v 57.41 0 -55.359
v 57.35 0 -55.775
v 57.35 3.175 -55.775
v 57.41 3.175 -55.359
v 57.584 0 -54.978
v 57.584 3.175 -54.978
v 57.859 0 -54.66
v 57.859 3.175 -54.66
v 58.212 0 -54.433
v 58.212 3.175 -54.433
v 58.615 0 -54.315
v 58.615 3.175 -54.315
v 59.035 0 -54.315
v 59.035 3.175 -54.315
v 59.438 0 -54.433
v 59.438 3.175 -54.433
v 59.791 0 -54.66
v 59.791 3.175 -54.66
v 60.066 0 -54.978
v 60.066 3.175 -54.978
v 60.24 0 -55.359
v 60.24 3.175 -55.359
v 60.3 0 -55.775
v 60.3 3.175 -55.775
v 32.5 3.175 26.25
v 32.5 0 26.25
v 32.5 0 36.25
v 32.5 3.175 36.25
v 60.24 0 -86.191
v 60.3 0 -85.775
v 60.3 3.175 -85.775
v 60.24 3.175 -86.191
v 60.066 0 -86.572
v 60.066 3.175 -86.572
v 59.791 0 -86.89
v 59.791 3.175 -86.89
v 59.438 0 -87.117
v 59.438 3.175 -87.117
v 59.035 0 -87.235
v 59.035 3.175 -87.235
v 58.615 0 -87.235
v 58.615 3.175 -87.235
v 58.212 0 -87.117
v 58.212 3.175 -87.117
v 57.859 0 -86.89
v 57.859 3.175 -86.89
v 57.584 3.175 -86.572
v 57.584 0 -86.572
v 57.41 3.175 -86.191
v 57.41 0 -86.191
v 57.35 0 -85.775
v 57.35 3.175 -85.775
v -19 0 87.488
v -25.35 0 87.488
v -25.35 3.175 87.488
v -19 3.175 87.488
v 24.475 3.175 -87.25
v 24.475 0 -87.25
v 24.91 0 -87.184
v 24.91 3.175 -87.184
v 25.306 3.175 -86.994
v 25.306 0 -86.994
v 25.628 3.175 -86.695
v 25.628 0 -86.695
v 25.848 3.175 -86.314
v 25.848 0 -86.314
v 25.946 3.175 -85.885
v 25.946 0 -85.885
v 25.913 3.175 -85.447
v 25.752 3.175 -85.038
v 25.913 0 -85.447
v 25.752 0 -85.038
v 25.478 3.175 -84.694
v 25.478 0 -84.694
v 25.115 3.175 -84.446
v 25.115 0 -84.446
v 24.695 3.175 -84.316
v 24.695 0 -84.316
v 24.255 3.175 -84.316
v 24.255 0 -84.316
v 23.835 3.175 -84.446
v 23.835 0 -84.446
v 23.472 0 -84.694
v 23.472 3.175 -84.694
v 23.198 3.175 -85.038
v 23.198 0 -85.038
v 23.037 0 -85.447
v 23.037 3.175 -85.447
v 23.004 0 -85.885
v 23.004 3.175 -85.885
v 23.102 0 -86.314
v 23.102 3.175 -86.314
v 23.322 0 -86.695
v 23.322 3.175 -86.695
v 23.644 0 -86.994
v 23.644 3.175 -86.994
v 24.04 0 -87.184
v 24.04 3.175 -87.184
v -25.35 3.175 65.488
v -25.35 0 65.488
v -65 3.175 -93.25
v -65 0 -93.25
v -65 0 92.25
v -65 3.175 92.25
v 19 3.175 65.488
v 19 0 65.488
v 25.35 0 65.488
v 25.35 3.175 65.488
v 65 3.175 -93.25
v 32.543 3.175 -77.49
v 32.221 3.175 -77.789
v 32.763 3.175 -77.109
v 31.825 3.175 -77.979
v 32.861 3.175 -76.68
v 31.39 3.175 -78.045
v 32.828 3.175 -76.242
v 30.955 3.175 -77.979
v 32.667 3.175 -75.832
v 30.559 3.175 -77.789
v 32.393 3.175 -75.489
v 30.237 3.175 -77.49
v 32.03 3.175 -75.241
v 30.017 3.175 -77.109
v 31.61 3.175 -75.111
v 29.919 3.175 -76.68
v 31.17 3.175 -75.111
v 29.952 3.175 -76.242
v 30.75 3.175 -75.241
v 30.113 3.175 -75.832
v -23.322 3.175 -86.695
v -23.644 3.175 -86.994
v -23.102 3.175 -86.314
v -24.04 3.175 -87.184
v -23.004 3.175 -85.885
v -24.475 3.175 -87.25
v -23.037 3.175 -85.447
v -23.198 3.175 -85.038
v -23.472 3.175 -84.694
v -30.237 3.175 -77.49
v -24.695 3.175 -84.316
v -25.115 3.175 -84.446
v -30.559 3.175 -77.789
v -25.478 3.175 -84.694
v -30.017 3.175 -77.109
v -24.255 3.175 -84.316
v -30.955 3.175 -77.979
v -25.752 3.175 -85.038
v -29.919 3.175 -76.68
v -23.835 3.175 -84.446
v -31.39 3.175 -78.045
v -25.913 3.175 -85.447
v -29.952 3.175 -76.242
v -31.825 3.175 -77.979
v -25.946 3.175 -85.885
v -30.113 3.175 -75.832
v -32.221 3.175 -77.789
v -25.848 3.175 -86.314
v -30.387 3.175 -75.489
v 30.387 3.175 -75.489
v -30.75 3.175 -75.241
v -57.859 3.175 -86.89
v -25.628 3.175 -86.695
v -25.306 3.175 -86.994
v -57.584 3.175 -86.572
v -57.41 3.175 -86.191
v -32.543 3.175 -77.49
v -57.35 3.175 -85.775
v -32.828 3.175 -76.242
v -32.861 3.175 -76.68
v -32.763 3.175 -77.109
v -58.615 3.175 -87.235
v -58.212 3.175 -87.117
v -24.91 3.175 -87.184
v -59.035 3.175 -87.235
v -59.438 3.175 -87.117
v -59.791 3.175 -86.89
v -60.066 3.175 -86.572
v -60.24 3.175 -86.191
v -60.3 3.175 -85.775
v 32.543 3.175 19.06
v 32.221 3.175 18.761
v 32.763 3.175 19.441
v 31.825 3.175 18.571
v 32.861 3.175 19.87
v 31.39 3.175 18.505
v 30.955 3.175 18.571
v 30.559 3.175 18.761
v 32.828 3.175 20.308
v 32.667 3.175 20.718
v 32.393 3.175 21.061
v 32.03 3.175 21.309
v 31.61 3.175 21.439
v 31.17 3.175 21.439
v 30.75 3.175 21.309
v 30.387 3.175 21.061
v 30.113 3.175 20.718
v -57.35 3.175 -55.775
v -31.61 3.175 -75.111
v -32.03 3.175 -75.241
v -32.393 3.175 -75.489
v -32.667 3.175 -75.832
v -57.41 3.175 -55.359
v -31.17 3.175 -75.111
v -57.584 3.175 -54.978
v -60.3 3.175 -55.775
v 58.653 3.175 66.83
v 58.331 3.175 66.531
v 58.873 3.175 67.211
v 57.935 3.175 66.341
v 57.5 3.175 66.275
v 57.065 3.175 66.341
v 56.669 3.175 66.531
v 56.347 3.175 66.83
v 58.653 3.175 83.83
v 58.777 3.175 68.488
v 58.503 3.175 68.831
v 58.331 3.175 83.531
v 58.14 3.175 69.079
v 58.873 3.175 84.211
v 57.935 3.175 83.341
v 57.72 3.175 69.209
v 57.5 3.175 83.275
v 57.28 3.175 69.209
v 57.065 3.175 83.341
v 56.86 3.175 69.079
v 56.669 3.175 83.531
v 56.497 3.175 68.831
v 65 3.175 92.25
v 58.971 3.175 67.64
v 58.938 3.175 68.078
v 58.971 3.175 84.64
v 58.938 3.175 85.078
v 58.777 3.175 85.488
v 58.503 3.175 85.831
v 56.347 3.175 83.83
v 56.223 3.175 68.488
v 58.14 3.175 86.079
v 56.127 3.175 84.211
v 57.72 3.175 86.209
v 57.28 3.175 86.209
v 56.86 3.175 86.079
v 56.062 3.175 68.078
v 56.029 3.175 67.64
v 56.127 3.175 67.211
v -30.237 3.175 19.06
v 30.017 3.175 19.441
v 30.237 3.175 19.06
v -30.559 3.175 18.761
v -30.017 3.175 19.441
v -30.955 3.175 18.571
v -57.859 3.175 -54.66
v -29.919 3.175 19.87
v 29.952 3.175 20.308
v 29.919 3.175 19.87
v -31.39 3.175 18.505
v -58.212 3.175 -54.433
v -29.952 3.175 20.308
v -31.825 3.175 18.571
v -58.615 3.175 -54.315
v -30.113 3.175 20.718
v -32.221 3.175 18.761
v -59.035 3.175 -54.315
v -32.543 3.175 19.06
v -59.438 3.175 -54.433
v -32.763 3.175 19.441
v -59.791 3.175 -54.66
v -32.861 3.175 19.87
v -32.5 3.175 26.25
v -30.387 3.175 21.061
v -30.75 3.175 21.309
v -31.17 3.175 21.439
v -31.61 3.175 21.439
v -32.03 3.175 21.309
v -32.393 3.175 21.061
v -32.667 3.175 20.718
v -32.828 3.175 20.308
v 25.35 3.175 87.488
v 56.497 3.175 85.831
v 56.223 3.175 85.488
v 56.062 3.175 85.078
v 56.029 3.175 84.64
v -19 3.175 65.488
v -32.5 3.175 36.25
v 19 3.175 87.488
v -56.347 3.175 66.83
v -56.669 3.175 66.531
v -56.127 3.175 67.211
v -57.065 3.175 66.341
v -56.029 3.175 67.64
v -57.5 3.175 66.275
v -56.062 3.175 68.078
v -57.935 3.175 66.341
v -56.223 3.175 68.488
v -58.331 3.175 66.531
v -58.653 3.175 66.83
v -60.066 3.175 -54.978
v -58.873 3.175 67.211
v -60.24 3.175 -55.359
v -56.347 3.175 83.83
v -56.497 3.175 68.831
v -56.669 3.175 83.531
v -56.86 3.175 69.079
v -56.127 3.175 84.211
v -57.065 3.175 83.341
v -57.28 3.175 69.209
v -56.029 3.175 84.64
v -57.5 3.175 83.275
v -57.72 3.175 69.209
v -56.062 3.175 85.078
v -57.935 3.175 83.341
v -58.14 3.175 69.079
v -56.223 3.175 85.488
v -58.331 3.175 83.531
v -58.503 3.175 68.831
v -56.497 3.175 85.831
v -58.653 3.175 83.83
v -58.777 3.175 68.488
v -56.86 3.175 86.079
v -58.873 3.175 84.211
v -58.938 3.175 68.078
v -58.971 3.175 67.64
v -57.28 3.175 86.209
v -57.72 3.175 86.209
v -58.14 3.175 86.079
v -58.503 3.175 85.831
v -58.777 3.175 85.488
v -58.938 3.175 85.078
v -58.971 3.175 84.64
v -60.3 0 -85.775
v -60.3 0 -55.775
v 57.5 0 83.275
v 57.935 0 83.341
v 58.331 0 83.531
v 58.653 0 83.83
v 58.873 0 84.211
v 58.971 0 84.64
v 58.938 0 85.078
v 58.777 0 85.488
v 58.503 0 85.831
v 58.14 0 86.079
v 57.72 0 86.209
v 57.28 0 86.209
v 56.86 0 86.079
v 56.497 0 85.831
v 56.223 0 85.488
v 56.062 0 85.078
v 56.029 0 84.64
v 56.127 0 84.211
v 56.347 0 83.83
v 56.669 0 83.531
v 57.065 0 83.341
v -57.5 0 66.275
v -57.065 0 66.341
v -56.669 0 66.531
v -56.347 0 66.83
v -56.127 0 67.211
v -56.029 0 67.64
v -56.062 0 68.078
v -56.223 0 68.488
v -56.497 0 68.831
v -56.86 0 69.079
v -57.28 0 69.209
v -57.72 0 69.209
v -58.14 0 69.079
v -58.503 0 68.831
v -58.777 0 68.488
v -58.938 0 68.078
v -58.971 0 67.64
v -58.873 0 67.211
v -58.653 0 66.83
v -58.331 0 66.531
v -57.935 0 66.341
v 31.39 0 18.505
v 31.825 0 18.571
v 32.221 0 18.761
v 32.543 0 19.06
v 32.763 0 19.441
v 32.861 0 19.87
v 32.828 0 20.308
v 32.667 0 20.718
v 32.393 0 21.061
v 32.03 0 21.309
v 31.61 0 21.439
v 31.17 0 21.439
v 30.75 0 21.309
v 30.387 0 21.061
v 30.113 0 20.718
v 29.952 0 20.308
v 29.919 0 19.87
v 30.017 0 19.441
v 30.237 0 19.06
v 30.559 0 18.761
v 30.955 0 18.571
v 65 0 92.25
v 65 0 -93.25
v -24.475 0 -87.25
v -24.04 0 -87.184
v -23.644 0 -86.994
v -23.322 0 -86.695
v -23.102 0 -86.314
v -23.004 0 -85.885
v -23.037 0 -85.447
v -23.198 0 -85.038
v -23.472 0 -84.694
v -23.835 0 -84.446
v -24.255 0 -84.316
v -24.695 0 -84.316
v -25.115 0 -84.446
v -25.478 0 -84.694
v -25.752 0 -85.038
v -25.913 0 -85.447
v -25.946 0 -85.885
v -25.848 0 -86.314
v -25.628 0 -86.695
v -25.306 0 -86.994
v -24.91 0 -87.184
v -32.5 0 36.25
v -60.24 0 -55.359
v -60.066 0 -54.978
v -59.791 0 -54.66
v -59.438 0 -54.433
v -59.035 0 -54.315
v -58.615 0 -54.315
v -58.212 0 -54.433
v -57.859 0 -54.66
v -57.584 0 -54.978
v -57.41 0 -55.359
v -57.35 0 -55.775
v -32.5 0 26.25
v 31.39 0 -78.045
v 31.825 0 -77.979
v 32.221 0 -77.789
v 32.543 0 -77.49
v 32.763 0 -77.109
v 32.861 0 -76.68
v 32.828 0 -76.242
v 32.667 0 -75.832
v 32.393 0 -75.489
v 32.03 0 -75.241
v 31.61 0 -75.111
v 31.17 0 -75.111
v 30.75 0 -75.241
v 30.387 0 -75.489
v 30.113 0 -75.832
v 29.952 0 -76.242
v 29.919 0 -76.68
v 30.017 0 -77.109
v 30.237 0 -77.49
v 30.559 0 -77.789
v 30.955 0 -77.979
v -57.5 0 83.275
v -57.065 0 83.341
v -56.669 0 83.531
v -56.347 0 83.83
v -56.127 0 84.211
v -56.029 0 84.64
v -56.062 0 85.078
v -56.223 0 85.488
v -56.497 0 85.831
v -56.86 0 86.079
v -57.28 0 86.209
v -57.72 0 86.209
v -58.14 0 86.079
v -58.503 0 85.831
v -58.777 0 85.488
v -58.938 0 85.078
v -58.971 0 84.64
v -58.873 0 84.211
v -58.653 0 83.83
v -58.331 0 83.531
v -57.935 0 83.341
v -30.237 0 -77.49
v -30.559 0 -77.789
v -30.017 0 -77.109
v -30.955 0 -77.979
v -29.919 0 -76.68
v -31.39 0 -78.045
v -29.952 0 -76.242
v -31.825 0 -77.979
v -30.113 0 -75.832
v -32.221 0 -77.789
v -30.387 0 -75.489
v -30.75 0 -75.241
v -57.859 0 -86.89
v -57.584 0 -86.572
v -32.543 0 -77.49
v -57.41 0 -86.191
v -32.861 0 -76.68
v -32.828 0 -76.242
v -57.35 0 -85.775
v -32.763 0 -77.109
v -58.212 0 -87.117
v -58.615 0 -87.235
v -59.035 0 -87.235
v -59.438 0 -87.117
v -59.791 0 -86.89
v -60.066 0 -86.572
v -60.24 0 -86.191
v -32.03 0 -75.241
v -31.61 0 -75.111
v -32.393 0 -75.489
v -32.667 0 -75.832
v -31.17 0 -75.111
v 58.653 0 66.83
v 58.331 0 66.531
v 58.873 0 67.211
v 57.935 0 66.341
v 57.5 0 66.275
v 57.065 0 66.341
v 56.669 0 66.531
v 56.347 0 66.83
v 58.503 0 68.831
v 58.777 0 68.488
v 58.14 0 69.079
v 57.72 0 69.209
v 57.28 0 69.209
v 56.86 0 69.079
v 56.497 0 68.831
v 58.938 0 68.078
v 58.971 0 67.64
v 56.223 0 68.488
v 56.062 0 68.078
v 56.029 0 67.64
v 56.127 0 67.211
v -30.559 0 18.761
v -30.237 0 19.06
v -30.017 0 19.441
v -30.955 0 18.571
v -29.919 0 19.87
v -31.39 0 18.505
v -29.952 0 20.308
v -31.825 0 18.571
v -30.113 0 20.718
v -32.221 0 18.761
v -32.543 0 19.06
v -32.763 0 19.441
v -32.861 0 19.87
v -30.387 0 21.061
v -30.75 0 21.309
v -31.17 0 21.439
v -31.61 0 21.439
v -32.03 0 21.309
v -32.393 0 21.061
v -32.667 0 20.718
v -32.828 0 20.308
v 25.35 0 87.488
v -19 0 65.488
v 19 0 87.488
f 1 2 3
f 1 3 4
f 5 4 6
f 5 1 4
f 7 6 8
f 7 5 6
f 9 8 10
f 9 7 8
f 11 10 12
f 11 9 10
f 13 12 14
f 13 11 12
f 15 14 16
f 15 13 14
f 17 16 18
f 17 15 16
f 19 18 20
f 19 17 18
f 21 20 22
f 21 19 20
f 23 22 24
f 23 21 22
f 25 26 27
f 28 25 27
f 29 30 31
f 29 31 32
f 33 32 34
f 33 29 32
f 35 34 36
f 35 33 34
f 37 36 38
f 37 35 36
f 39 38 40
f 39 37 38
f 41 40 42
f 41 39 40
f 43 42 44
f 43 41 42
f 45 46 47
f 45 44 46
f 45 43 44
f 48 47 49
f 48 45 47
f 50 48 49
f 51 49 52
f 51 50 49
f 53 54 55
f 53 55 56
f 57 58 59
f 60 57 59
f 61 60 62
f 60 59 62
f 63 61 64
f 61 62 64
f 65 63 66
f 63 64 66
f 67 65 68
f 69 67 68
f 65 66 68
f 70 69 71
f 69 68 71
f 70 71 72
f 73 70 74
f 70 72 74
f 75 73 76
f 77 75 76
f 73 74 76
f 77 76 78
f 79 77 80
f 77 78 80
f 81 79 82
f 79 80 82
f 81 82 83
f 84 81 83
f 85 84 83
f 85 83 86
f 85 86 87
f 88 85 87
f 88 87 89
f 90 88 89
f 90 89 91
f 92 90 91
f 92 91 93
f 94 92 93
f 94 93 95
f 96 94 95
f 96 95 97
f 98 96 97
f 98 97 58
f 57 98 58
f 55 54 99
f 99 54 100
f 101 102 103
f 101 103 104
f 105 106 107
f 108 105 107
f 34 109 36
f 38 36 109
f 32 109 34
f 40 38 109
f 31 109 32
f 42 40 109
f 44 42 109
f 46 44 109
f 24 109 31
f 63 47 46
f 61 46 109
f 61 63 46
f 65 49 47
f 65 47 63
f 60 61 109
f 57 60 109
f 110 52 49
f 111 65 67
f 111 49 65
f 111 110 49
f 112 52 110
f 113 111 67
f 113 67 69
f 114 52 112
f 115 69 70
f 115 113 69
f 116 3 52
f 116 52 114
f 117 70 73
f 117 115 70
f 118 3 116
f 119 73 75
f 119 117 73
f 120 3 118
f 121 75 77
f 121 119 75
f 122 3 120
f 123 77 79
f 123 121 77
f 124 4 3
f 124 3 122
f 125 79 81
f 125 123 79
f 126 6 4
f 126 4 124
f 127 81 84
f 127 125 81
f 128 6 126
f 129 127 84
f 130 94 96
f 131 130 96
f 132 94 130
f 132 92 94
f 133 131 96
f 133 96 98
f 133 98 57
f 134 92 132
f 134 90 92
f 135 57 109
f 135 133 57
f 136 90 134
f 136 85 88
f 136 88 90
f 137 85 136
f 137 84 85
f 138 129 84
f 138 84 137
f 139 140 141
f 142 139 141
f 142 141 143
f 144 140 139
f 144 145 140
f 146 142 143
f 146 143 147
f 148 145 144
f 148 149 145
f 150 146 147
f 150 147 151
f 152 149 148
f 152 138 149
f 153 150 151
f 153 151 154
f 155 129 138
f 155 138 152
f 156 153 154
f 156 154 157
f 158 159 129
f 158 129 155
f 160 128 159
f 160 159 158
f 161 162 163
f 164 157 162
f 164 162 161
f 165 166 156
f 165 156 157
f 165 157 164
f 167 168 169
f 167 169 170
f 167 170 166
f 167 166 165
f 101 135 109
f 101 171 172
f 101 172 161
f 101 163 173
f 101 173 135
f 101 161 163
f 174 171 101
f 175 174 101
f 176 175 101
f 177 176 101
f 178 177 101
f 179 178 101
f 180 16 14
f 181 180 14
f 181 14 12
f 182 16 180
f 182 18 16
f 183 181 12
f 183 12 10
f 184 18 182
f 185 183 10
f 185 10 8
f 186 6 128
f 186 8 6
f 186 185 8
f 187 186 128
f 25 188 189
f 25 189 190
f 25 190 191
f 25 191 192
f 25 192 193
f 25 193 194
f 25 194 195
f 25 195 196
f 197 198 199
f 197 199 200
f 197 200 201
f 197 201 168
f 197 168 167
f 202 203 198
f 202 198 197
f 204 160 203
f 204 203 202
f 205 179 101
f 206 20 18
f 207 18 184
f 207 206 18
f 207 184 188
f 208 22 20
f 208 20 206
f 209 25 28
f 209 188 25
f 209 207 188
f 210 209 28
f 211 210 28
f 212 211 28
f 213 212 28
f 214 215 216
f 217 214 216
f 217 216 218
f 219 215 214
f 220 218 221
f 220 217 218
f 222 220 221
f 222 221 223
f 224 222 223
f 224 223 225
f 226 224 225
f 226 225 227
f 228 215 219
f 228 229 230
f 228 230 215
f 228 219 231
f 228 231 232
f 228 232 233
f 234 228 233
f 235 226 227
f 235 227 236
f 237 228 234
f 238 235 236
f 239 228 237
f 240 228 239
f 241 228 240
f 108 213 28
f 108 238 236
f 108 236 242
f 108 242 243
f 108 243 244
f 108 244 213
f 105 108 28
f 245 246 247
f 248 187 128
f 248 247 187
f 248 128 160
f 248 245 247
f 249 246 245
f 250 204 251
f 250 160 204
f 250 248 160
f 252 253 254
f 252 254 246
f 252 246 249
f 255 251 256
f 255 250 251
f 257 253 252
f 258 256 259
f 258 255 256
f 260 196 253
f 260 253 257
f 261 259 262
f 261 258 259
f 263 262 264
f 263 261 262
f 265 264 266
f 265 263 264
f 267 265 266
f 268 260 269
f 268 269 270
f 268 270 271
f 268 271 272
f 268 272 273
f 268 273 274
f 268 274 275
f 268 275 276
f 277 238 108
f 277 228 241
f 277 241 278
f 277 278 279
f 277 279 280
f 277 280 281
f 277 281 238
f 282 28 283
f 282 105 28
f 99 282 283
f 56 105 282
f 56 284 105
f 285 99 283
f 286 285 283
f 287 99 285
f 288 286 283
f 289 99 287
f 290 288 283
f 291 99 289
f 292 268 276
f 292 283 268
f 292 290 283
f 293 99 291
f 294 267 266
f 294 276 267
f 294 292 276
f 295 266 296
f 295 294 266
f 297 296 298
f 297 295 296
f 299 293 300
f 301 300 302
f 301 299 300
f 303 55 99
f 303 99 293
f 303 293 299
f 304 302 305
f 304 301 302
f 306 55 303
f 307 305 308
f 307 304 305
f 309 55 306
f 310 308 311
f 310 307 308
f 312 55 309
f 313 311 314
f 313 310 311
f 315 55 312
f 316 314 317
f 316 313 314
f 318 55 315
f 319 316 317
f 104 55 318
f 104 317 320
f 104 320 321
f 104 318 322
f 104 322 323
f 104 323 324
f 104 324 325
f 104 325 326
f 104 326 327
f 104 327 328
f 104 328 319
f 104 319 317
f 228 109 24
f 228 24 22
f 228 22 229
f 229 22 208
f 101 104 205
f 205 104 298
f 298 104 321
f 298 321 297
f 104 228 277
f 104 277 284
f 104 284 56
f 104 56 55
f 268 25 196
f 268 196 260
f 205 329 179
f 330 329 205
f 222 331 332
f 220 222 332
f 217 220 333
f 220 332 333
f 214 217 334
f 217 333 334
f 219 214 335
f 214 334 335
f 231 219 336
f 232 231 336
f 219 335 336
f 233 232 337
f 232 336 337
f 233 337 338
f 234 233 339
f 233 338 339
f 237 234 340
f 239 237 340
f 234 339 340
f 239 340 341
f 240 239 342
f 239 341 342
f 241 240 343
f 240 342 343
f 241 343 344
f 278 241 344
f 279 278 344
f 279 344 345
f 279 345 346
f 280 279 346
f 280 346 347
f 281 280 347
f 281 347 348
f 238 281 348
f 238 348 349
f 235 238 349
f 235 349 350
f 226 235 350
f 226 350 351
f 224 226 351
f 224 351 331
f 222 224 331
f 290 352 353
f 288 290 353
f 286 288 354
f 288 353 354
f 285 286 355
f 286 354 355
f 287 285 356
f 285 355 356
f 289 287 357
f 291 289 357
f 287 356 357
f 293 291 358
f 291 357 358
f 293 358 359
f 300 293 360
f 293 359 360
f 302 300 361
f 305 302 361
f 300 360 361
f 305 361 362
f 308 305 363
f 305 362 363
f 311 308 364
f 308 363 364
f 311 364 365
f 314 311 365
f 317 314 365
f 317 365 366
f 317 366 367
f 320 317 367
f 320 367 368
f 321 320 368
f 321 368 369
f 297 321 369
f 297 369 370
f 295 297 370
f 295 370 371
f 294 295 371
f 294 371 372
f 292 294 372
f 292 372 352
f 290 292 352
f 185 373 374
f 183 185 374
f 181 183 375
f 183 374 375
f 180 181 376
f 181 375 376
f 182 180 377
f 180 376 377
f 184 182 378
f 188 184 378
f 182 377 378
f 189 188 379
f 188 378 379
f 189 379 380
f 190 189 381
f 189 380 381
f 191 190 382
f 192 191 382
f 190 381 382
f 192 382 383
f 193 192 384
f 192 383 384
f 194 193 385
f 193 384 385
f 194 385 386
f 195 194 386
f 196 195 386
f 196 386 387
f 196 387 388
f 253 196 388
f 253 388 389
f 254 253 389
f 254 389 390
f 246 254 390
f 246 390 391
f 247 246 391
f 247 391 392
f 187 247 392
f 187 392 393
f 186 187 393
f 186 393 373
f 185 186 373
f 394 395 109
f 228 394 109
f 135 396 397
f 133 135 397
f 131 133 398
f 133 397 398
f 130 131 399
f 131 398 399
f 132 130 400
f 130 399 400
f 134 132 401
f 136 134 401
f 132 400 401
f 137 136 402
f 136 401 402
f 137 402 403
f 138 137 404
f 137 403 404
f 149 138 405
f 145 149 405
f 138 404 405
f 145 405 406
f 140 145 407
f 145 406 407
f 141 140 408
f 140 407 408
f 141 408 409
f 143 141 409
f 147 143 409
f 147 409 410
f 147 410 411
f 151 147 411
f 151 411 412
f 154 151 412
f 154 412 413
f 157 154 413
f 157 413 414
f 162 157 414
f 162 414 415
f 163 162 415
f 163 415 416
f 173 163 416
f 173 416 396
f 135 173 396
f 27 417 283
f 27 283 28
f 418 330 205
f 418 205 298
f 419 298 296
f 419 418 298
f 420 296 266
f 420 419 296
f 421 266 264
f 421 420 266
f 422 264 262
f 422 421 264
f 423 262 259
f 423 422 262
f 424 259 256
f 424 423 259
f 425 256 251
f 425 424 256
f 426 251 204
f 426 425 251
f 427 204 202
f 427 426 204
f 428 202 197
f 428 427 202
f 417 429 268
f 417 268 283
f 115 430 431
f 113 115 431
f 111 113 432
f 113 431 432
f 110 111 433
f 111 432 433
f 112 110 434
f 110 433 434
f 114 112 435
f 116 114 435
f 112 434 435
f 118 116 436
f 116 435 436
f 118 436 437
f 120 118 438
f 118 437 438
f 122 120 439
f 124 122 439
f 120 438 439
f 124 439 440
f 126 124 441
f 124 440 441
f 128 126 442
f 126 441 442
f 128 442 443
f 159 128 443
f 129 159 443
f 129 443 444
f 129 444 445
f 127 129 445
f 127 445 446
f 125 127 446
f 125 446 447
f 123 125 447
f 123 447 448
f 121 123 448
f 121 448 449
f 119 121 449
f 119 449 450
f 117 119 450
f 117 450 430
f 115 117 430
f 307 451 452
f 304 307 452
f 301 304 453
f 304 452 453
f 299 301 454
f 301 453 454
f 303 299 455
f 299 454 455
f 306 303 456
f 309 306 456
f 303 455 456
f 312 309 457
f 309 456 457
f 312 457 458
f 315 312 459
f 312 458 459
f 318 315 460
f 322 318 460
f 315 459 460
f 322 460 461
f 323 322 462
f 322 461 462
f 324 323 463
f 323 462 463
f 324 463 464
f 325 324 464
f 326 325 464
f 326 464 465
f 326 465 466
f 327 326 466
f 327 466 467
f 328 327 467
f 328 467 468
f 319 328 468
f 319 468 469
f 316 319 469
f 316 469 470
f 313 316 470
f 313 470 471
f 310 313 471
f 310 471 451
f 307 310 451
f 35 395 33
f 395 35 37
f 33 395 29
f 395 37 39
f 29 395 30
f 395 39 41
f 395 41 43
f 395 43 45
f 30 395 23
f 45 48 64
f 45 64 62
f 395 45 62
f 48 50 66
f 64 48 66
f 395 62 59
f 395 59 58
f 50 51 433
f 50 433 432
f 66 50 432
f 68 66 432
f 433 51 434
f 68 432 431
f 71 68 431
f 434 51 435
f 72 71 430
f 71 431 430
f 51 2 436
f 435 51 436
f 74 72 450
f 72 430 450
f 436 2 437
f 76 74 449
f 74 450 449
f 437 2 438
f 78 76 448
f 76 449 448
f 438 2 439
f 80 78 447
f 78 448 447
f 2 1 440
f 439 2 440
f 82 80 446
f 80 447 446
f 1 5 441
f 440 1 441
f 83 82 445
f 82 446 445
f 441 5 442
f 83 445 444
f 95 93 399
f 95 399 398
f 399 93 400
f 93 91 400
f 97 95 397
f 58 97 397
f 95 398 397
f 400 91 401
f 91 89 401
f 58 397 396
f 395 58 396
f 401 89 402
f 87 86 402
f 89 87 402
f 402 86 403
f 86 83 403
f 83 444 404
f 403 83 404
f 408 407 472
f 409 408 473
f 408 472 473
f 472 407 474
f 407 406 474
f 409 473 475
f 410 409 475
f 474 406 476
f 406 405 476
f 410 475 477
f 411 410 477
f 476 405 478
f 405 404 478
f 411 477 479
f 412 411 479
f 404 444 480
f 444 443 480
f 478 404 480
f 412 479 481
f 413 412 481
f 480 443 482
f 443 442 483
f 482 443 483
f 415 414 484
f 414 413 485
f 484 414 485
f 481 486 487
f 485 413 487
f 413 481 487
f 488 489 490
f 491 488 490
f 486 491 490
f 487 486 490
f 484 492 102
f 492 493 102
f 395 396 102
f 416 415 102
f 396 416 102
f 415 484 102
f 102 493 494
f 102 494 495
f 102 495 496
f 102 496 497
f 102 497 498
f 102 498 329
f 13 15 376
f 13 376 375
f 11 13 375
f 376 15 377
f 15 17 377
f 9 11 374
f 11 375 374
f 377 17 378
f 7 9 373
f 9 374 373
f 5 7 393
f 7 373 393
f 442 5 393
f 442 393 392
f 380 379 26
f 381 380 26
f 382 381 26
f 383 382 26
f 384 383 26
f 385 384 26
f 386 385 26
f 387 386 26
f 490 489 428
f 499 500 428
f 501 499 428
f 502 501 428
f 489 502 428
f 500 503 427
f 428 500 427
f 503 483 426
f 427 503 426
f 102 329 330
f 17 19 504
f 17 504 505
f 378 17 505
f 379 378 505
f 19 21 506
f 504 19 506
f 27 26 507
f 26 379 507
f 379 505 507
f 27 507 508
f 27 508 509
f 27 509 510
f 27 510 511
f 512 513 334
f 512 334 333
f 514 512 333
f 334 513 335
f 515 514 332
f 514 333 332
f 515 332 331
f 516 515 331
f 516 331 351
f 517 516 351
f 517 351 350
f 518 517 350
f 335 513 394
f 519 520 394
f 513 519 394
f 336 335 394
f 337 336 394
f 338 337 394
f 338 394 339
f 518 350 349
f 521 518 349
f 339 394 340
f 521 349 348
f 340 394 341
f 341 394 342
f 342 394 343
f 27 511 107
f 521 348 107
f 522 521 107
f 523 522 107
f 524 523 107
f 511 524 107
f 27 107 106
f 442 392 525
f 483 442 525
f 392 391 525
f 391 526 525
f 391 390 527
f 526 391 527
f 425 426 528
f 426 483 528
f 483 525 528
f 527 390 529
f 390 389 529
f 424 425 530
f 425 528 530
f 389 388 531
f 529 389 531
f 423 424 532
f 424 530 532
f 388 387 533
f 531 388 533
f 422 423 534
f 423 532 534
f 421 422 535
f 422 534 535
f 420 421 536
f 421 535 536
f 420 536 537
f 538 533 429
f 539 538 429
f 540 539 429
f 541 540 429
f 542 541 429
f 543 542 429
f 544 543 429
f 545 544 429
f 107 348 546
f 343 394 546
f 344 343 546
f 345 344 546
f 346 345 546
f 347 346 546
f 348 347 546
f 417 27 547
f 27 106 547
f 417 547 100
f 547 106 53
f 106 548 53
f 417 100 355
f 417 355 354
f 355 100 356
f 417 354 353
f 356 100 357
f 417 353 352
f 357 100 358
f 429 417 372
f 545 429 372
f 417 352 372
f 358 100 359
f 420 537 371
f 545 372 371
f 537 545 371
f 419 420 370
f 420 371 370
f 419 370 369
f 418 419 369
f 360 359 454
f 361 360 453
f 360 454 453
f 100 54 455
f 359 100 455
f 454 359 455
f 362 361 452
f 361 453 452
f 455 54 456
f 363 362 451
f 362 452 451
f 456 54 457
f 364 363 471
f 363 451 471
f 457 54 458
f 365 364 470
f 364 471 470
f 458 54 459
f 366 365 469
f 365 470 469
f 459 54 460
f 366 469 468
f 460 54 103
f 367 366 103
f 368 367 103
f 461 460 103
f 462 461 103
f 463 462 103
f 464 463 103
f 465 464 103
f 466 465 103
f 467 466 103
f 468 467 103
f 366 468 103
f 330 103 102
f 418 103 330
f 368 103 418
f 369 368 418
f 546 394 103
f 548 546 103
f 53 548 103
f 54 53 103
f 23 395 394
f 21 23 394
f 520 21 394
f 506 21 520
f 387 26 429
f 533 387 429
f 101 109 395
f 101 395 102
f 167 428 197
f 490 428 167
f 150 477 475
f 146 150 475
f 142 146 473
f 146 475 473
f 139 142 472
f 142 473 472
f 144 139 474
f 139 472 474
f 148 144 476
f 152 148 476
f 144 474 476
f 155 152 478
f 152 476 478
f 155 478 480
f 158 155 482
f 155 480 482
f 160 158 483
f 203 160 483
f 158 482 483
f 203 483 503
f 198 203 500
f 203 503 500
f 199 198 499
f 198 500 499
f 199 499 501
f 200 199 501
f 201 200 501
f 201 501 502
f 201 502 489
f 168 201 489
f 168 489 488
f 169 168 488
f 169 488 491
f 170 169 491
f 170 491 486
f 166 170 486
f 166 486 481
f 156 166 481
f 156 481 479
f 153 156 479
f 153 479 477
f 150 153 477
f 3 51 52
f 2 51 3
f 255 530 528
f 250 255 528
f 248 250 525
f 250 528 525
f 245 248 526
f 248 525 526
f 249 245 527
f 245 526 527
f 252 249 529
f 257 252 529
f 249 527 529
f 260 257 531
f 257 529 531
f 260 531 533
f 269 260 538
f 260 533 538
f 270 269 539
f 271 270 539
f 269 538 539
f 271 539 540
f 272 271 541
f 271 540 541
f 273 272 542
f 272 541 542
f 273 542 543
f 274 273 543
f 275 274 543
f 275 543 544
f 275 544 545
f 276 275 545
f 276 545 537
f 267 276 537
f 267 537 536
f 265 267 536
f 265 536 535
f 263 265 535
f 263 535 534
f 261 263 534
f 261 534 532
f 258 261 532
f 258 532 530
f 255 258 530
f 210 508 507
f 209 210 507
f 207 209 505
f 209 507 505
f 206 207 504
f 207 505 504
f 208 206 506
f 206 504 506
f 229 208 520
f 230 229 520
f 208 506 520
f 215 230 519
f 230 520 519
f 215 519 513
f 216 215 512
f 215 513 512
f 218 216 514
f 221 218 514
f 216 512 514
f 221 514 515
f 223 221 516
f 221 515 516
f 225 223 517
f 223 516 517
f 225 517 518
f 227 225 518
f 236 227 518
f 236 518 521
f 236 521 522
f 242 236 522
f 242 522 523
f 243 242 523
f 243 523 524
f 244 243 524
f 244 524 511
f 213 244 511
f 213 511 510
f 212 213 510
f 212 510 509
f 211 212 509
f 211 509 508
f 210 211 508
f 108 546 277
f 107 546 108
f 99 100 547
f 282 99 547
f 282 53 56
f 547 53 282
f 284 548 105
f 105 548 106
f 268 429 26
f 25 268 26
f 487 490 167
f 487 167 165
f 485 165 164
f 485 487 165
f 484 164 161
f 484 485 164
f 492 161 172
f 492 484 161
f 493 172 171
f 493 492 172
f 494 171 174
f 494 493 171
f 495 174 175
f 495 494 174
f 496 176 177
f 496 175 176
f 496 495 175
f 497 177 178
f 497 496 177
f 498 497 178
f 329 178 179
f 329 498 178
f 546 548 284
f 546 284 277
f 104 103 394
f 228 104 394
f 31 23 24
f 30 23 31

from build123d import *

# Parameters (mm, degrees)
SKETCH1_W               = 130
SKETCH1_H               = 184.5
BOSS_EXTRUDE1_DEPTH     = 3.175
SKETCH4_R               = 1.475
CUT_EXTRUDE3_DEPTH      = 113.894389254
SKETCH5_R               = 1.475
CUT_EXTRUDE4_DEPTH      = 10
SKETCH6_W               = 130
SKETCH6_H               = 3.175
BOSS_EXTRUDE2_DEPTH     = 1
CUT_EXTRUDE5_DEPTH      = 114.712985736
CUT_EXTRUDE5_DEPTH_BACK = 114.712985736
SKETCH7_W               = 6.35
SKETCH7_H               = 22
SKETCH8_W               = 65
SKETCH8_H               = 10
CUT_EXTRUDE6_DEPTH      = 10
SKETCH9_R               = 1.475
CUT_EXTRUDE7_DEPTH      = 75
SKETCH10_W              = 78.139021678
SKETCH10_H              = 97.798202291
BOSS_EXTRUDE3_DEPTH     = 3.175
SKETCH11_R              = 1.475
CUT_EXTRUDE8_DEPTH      = 10


with BuildPart() as part:
    # Sketch1 → Boss-Extrude1 (new body)
    with BuildSketch(Plane(origin=(0, 0, 0), x_dir=(1, 0, 0), z_dir=(0, 1, 0))):
        Rectangle(SKETCH1_W, SKETCH1_H)
    extrude(amount=BOSS_EXTRUDE1_DEPTH)

    # Sketch4 → Cut-Extrude3 (cut, through all)
    with BuildSketch(Plane(origin=(0, 0, 0), x_dir=(-1, 0, 0), z_dir=(0, -1, 0))):
        with Locations(Location((-57.5, -84.75, 0), (0, 0, 90))):
            Circle(SKETCH4_R)
        with Locations(Location((-57.5, -67.75, 0), (0, 0, 90))):
            Circle(SKETCH4_R)
        with Locations(Location((57.5, -84.75, 0), (0, 0, 90))):
            Circle(SKETCH4_R)
        with Locations(Location((57.5, -67.75, 0), (0, 0, 90))):
            Circle(SKETCH4_R)
        with BuildLine():
            Line((-57.35, 85.775), (-57.35, 55.775))
            ThreePointArc((-57.35, 55.775), (-58.825, 54.3), (-60.3, 55.775))
            Line((-60.3, 55.775), (-60.3, 85.775))
            ThreePointArc((-60.3, 85.775), (-58.825, 87.25), (-57.35, 85.775))
        make_face()
        with BuildLine():
            Line((60.3, 85.775), (60.3, 55.775))
            ThreePointArc((60.3, 55.775), (58.825, 54.3), (57.35, 55.775))
            Line((57.35, 55.775), (57.35, 85.775))
            ThreePointArc((57.35, 85.775), (58.825, 87.25), (60.3, 85.775))
        make_face()
    extrude(amount=-CUT_EXTRUDE3_DEPTH, mode=Mode.SUBTRACT)

    # Sketch5 → Cut-Extrude4 (cut)
    with BuildSketch(Plane.XZ):
        with Locations(Location((-24.475, -85.775, 0), (0, 0, 270))):
            Circle(SKETCH5_R)
        with Locations(Location((24.475, -85.775, 0), (0, 0, 270))):
            Circle(SKETCH5_R)
    extrude(amount=-CUT_EXTRUDE4_DEPTH, mode=Mode.SUBTRACT)

    # Sketch6 → Boss-Extrude2 (add)
    with BuildSketch(Plane(origin=(0, 0, -92.25), x_dir=(-1, 0, 0), z_dir=(0, 0, -1))):
        with Locations((0, 1.5875)):
            Rectangle(SKETCH6_W, SKETCH6_H)
    extrude(amount=BOSS_EXTRUDE2_DEPTH)

    # Sketch7 → Cut-Extrude5 (cut, two sides: drawn at the far end of the back side and taken through both)
    with BuildSketch(Plane(origin=(0, 3.175, 0), x_dir=(1, 0, 0), z_dir=(0, 1, 0)).offset(-CUT_EXTRUDE5_DEPTH_BACK)):
        with Locations((-22.175, -76.48843537)):
            Rectangle(SKETCH7_W, SKETCH7_H)
        with Locations((22.175, -76.48843537)):
            Rectangle(SKETCH7_W, SKETCH7_H)
    extrude(amount=CUT_EXTRUDE5_DEPTH + CUT_EXTRUDE5_DEPTH_BACK, mode=Mode.SUBTRACT)

    # Sketch8 → Cut-Extrude6 (cut)
    with BuildSketch(Plane.XZ):
        with Locations((0, 31.25)):
            Rectangle(SKETCH8_W, SKETCH8_H)
    extrude(amount=-CUT_EXTRUDE6_DEPTH, mode=Mode.SUBTRACT)

    # Sketch9 → Cut-Extrude7 (cut)
    with BuildSketch(Plane(origin=(0, 0, 0), x_dir=(-1, 0, 0), z_dir=(0, -1, 0))):
        with BuildLine():
            ThreePointArc((-28.525, -12.75), (-28.957017498, -11.707017498), (-30, -11.275))
            Line((-30, -11.275), (-30, -12.75))
            Line((-30, -12.75), (-28.525, -12.75))
        make_face()
        with BuildLine():
            Line((-30, -12.75), (-30, -11.275))
            ThreePointArc((-30, -11.275), (-31.042982502, -13.792982502), (-28.525, -12.75))
            Line((-28.525, -12.75), (-30, -12.75))
        make_face()
        with BuildLine():
            ThreePointArc((-30, 73.775), (-28.957017498, 74.207017498), (-28.525, 75.25))
            Line((-28.525, 75.25), (-30, 75.25))
            Line((-30, 75.25), (-30, 73.775))
        make_face()
        with BuildLine():
            Line((-30, 75.25), (-28.525, 75.25))
            ThreePointArc((-28.525, 75.25), (-31.042982502, 76.292982502), (-30, 73.775))
            Line((-30, 73.775), (-30, 75.25))
        make_face()
        with Locations(Location((30, -12.75, 0), (0, 0, 90))):
            Circle(SKETCH9_R)
        with Locations(Location((30, 75.25, 0), (0, 0, 90))):
            Circle(SKETCH9_R)
    extrude(amount=-CUT_EXTRUDE7_DEPTH, mode=Mode.SUBTRACT)

    # Sketch10 → Boss-Extrude3 (add)
    with BuildSketch(Plane(origin=(0, 0, 0), x_dir=(-1, 0, 0), z_dir=(0, -1, 0))):
        with Locations((-1.9908031, 30.735322083)):
            Rectangle(SKETCH10_W, SKETCH10_H)
    extrude(amount=-BOSS_EXTRUDE3_DEPTH)

    # Sketch11 → Cut-Extrude8 (cut)
    with BuildSketch(Plane(origin=(0, 0, 0), x_dir=(-1, 0, 0), z_dir=(0, -1, 0))):
        with Locations(Location((31.39, -19.98, 0), (0, 0, 90))):
            Circle(SKETCH11_R)
        with Locations(Location((31.39, 76.57, 0), (0, 0, 90))):
            Circle(SKETCH11_R)
        with Locations(Location((-31.39, -19.98, 0), (0, 0, 90))):
            Circle(SKETCH11_R)
        with Locations(Location((-31.39, 76.57, 0), (0, 0, 90))):
            Circle(SKETCH11_R)
    extrude(amount=-CUT_EXTRUDE8_DEPTH, mode=Mode.SUBTRACT)


solid = part.part
